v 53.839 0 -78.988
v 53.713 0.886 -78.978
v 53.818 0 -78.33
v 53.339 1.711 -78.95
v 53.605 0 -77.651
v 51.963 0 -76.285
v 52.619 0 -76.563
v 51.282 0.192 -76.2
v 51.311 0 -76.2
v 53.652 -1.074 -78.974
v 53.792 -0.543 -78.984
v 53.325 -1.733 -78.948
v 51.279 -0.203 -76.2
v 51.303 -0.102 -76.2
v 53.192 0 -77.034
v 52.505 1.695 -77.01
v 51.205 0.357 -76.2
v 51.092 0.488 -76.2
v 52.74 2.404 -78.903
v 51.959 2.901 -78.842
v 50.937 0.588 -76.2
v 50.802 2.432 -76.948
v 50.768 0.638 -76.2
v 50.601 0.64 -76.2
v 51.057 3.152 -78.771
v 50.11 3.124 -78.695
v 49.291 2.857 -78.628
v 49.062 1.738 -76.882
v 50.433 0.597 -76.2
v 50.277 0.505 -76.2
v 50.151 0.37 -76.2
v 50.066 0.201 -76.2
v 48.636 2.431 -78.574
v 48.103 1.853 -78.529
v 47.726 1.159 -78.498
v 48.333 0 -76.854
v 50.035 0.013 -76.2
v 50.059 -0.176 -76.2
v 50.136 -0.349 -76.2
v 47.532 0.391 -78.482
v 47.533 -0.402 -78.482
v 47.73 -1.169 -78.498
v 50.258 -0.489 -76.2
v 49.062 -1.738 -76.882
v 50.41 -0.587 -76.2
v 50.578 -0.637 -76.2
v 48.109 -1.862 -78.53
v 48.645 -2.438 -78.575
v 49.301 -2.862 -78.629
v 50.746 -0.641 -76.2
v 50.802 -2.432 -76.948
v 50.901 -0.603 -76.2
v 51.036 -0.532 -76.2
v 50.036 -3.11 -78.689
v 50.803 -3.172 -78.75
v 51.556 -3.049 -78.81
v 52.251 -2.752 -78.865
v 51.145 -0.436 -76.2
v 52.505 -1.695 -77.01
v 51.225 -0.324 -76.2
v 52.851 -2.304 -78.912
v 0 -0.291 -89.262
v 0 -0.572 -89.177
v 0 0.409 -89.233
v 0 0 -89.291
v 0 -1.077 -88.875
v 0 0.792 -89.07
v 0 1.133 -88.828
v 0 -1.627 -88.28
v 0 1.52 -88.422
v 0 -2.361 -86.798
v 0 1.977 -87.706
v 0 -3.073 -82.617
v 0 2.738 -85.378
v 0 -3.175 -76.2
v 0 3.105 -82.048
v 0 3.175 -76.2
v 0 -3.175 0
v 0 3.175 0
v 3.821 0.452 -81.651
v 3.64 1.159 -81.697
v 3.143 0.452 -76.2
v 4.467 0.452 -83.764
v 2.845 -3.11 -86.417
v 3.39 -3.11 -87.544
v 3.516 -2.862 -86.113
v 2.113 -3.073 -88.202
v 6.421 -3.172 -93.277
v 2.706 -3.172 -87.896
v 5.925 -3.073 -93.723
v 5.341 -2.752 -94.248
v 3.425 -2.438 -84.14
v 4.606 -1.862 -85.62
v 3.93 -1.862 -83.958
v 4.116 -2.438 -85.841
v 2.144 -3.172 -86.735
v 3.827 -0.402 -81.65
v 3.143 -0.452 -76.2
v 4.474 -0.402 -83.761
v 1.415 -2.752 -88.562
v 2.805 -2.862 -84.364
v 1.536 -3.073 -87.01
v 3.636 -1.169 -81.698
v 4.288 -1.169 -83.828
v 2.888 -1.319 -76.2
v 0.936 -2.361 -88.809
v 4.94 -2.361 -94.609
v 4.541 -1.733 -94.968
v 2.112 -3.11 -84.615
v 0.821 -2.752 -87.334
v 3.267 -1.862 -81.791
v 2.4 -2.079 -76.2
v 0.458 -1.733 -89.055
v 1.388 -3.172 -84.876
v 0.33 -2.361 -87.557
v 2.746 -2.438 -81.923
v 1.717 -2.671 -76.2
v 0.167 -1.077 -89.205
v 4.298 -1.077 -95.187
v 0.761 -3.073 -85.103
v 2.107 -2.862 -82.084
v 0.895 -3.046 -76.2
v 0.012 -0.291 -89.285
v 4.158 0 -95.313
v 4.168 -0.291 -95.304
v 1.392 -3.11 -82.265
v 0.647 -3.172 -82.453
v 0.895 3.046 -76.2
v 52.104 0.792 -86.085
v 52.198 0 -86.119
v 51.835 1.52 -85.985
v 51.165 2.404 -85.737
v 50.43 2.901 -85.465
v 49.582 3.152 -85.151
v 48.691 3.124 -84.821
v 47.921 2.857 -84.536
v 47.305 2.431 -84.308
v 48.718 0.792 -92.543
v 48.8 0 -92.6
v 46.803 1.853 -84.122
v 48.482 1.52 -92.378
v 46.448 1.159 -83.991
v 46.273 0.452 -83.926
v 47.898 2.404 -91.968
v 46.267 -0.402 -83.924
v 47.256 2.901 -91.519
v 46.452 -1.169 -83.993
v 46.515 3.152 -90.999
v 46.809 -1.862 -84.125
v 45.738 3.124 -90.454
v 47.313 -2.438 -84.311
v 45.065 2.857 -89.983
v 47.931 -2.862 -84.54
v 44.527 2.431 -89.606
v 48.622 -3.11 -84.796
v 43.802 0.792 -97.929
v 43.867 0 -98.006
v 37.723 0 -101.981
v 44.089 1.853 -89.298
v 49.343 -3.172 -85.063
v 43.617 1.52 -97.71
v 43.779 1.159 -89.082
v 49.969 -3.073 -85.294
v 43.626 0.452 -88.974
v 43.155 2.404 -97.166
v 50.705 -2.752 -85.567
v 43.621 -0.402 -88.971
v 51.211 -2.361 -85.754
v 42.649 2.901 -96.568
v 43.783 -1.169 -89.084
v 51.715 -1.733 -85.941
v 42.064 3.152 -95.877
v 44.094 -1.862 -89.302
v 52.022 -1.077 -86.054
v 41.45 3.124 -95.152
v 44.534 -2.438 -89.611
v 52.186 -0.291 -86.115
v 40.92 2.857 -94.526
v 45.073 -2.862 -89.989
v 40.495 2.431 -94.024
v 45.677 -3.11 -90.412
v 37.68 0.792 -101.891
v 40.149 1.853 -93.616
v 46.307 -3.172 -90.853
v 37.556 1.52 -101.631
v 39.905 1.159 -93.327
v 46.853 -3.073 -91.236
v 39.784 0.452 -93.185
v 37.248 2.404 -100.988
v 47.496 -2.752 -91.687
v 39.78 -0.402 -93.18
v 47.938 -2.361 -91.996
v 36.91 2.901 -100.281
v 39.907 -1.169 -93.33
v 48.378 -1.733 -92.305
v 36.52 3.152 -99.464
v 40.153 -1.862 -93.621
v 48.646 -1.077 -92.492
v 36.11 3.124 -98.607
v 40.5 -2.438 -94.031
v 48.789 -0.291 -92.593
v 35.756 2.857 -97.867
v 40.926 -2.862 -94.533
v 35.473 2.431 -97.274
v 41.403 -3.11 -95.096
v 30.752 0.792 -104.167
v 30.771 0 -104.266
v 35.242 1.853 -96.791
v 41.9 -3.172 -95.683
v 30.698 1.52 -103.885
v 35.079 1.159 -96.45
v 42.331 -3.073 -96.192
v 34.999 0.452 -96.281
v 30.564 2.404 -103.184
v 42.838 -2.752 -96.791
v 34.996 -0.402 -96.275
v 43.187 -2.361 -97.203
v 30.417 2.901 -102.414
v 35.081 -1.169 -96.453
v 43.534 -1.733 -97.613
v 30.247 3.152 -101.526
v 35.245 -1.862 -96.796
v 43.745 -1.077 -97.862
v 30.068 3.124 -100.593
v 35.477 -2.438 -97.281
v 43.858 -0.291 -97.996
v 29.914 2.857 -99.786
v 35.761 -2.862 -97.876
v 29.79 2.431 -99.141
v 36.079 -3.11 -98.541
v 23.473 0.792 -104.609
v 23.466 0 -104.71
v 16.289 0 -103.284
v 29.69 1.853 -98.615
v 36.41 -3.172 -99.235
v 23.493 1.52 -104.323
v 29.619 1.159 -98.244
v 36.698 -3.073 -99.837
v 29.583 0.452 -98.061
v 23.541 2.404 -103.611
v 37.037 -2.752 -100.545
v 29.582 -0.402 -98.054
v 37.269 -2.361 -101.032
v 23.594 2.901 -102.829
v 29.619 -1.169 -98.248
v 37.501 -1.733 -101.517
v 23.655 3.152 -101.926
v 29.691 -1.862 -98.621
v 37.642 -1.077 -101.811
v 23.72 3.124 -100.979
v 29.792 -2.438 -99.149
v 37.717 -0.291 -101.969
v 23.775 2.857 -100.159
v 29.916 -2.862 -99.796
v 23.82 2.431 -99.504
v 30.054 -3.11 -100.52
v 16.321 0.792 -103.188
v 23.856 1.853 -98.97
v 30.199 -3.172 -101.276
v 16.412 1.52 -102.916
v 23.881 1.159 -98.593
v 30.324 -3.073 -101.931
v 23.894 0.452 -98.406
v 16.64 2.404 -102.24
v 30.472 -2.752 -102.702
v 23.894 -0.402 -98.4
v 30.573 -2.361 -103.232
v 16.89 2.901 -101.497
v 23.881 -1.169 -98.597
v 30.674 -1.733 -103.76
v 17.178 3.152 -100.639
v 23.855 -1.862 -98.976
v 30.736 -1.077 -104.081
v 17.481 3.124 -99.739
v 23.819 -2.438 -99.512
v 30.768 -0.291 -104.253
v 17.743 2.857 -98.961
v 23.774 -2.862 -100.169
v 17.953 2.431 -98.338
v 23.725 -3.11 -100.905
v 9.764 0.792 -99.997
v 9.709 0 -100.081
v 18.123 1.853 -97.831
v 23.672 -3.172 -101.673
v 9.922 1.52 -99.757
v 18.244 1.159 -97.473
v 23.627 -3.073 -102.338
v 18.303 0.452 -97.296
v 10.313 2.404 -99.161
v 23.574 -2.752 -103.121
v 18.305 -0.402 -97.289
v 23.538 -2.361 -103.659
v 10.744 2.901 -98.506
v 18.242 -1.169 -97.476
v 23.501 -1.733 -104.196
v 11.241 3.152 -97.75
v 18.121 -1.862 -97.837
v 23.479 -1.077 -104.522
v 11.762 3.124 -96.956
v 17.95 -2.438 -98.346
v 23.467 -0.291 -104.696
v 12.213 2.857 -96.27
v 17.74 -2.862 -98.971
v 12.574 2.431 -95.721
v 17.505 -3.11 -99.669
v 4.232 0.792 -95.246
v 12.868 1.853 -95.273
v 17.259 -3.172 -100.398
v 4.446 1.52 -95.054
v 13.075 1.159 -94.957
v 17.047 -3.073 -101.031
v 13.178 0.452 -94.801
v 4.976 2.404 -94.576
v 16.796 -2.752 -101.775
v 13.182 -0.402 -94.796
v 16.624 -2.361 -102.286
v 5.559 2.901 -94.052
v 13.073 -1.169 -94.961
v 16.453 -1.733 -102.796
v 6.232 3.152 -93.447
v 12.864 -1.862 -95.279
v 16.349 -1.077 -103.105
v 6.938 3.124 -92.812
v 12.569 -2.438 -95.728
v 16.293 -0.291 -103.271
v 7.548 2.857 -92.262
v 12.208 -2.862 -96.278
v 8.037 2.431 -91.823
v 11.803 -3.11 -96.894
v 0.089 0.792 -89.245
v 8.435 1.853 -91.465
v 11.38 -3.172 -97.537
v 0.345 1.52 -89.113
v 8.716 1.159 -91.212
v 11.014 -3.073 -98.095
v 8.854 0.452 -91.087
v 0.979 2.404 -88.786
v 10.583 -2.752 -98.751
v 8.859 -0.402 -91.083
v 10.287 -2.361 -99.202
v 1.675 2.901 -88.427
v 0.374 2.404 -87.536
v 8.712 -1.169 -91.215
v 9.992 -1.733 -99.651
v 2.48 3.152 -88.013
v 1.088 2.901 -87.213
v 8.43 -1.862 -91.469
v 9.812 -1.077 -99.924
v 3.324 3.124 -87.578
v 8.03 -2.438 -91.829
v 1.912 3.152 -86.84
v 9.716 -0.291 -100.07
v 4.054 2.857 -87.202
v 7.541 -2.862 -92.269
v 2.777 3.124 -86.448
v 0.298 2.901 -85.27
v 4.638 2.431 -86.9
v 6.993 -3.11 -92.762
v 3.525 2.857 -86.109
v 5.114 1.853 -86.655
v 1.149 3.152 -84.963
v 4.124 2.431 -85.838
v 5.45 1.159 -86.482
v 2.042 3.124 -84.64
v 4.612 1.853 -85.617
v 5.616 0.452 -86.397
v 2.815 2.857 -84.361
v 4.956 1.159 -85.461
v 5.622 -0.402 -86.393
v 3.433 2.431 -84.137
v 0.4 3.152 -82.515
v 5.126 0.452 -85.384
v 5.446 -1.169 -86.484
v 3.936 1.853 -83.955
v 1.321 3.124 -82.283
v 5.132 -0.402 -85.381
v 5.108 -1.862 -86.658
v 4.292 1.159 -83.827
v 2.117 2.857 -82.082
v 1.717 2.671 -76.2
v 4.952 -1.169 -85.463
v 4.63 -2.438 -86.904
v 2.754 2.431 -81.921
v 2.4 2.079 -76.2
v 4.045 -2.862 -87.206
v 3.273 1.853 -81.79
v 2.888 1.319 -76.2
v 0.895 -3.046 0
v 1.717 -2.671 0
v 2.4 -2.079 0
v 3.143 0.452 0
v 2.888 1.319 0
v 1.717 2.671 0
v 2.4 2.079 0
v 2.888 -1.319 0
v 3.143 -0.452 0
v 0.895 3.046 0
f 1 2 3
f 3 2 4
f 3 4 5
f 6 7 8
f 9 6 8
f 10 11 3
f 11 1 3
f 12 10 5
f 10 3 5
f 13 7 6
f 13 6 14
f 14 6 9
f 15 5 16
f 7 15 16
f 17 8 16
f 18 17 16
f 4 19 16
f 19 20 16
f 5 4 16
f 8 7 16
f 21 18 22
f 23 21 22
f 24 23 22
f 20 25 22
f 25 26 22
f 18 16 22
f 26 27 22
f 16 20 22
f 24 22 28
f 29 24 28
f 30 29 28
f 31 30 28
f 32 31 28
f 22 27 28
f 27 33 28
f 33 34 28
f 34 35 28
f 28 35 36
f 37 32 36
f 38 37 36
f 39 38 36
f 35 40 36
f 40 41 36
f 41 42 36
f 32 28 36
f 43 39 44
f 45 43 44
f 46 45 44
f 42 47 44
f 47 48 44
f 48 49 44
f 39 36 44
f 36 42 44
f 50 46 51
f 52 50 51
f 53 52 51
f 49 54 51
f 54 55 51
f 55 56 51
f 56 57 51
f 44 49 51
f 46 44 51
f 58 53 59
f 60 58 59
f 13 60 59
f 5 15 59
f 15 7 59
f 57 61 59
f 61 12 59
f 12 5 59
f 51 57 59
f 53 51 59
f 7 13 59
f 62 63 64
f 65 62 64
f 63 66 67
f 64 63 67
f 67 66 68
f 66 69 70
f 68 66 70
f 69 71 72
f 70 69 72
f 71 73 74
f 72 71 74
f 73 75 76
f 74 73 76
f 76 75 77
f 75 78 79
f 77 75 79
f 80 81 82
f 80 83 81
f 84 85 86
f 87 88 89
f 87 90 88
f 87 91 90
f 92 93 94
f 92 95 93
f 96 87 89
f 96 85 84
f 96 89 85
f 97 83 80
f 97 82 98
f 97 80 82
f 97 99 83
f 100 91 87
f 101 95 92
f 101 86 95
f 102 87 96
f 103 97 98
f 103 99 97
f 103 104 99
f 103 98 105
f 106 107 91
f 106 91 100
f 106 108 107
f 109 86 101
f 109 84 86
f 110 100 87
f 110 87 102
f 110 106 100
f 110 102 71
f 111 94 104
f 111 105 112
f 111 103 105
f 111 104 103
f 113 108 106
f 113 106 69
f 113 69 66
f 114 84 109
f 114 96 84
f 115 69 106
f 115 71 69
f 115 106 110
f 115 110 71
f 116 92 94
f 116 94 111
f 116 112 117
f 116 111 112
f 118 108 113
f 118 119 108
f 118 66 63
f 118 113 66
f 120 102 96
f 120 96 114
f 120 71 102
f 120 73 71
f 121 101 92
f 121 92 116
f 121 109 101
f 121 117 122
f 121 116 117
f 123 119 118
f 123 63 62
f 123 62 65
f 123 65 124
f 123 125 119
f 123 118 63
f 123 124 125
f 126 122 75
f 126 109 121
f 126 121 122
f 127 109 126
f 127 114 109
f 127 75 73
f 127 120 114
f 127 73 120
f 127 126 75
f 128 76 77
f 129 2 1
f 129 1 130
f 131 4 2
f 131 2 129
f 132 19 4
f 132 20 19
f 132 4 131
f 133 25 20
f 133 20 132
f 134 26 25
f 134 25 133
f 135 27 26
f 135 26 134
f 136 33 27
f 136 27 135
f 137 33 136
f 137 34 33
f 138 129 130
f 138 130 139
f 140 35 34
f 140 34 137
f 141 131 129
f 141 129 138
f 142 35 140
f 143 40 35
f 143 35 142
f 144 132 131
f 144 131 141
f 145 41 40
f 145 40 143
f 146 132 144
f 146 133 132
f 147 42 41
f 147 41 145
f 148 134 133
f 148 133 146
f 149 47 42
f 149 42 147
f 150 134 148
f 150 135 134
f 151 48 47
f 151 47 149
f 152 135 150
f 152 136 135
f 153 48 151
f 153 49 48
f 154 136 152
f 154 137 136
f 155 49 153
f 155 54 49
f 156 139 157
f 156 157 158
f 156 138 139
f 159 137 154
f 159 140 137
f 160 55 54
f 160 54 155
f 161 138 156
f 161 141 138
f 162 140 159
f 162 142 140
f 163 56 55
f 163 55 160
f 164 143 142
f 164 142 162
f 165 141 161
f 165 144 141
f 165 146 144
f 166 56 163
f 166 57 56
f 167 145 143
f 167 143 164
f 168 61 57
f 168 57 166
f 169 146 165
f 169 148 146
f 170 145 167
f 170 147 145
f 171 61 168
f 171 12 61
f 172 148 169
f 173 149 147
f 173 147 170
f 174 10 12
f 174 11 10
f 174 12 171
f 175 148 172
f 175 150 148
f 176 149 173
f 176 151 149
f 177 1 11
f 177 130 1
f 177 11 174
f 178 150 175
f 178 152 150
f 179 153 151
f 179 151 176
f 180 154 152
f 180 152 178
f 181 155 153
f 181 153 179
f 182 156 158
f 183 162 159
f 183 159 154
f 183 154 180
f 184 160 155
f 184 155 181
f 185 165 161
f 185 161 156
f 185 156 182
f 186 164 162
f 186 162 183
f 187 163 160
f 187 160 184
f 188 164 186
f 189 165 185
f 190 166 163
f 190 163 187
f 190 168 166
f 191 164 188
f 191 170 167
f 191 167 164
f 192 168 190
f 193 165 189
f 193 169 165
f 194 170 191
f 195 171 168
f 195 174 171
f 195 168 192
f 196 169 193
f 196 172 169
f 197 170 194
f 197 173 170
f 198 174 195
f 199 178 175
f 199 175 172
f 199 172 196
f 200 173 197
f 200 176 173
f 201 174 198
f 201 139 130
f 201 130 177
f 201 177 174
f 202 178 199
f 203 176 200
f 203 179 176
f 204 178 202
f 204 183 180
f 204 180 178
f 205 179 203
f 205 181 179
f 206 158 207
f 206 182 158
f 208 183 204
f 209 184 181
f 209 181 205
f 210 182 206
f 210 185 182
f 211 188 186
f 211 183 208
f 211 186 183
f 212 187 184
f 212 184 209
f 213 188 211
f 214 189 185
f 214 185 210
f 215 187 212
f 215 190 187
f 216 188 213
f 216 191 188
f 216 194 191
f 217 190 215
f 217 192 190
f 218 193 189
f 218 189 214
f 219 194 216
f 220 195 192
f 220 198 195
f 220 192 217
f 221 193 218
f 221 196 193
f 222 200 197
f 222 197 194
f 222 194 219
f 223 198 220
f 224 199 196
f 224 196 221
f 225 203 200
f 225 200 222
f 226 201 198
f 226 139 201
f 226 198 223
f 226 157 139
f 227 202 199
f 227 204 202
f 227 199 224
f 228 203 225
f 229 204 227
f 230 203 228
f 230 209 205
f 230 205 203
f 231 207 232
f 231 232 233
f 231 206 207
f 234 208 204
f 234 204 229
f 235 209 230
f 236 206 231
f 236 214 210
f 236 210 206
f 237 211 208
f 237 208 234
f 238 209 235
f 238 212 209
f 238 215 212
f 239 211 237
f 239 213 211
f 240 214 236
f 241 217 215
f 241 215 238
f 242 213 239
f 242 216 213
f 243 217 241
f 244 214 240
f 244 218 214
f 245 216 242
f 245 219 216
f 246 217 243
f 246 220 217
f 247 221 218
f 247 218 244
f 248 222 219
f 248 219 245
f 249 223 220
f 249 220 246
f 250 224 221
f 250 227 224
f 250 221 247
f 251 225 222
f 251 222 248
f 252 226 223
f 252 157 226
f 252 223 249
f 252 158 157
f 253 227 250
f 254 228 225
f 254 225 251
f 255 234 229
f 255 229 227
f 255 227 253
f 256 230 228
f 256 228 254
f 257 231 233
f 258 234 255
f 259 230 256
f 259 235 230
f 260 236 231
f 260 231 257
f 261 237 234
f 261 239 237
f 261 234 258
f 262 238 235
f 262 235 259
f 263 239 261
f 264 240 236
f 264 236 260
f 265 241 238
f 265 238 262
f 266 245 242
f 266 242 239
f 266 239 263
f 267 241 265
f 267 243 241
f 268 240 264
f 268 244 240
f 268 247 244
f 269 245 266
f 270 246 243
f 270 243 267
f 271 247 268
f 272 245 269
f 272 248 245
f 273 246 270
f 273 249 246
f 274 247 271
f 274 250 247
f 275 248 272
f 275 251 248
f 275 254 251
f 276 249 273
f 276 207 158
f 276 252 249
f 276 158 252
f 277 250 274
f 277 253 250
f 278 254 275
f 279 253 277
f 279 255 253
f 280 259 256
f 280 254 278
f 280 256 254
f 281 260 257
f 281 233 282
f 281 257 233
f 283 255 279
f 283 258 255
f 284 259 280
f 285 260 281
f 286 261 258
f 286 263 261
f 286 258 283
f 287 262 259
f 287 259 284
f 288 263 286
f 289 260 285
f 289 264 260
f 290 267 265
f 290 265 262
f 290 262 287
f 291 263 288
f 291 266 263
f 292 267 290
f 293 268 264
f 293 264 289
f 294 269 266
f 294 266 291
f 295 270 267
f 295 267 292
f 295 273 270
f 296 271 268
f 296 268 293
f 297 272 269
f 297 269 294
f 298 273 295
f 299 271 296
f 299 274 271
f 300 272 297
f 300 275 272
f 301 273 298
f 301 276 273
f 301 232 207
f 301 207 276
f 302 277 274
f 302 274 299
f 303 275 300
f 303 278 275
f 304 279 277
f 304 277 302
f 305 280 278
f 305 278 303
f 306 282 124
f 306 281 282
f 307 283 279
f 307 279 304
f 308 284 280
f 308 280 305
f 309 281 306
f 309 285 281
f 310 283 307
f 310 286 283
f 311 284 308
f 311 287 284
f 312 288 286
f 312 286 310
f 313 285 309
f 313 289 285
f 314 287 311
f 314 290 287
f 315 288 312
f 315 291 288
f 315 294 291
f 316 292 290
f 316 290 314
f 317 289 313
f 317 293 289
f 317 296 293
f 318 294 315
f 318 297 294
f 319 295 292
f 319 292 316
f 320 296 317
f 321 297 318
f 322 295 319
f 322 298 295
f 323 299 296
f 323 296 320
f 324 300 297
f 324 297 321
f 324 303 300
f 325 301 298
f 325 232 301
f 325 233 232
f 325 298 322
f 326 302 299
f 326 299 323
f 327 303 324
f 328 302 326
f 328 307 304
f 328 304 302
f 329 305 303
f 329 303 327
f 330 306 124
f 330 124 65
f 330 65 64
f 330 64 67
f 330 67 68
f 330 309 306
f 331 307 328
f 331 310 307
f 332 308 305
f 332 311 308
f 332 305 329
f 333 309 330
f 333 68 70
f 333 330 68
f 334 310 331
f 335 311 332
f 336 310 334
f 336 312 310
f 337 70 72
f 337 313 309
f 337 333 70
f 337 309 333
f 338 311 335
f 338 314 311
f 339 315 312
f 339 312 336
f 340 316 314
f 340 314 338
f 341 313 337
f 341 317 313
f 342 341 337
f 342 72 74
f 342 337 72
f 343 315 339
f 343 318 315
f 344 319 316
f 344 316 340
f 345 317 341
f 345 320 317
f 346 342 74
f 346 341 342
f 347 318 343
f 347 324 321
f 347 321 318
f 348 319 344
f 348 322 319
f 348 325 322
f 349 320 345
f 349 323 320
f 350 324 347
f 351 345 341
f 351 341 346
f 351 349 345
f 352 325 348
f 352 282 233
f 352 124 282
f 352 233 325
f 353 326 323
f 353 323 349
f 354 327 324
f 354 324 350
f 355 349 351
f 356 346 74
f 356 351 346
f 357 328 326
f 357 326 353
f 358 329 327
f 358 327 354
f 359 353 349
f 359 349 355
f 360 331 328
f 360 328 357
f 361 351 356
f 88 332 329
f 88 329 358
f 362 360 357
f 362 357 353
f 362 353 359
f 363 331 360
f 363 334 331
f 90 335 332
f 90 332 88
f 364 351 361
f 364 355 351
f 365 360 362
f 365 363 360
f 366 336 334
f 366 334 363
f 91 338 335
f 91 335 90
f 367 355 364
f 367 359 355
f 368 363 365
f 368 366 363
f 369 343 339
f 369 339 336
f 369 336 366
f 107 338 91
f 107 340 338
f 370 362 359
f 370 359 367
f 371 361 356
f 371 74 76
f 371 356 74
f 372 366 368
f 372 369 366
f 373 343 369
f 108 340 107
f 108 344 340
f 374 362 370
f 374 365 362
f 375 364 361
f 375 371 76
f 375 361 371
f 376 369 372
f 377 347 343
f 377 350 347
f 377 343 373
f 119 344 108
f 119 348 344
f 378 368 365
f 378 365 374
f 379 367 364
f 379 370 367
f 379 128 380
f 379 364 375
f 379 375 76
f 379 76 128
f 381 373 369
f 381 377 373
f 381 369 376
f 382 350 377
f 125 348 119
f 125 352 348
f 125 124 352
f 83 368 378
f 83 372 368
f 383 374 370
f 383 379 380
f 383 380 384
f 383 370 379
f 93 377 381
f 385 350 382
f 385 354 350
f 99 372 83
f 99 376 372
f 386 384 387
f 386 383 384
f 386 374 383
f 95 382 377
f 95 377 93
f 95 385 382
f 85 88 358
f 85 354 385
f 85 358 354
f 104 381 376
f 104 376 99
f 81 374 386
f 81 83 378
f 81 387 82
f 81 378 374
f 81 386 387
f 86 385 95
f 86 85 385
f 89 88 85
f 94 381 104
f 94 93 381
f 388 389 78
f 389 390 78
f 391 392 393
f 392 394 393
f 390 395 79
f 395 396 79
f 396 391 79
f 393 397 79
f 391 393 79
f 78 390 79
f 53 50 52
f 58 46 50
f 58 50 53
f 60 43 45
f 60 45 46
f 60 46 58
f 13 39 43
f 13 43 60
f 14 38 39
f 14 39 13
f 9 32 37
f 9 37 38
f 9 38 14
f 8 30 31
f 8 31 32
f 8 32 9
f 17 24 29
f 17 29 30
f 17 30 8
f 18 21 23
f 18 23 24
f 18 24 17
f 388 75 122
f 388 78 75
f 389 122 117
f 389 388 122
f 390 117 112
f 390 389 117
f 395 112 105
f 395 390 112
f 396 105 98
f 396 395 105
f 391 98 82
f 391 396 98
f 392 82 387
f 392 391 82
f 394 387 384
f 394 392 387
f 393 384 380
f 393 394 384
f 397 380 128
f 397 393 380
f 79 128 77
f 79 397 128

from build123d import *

# Parameters (mm, degrees)
F2_R     = 3.175
F4_R     = 2.54
F5_W     = 34.6189280972
F5_H     = 141.0606596619
F6_DEPTH = 25.4


with BuildPart() as f3:
    # F3: sweep along a path in F0
    with BuildLine(Plane.XZ) as f3_path:
        ThreePointArc((50.8, -76.2), (25.4, -101.6), (0, -76.2))
        Line((0, -76.2), (0, 0))
    # F2 (on plane+point) → F3 (sweep)
    with BuildSketch(Plane.XY.offset(-76.2)):
        with Locations((50.8, 0)):
            Circle(F2_R)
    sweep(path=f3_path.line)

    # F4
    f4_edges = [f3.edges().sort_by_distance(p)[0] for p in [
        (47.625, 0, -76.2),
    ]]
    fillet(f4_edges, radius=F4_R)

    # F5 (on Right) → F6 (cut)
    with BuildSketch(Plane.YZ):
        with Locations((-2.6043397374, -54.7910733148)):
            Rectangle(F5_W, F5_H)
    extrude(amount=-F6_DEPTH, mode=Mode.SUBTRACT)


solid = f3.part
